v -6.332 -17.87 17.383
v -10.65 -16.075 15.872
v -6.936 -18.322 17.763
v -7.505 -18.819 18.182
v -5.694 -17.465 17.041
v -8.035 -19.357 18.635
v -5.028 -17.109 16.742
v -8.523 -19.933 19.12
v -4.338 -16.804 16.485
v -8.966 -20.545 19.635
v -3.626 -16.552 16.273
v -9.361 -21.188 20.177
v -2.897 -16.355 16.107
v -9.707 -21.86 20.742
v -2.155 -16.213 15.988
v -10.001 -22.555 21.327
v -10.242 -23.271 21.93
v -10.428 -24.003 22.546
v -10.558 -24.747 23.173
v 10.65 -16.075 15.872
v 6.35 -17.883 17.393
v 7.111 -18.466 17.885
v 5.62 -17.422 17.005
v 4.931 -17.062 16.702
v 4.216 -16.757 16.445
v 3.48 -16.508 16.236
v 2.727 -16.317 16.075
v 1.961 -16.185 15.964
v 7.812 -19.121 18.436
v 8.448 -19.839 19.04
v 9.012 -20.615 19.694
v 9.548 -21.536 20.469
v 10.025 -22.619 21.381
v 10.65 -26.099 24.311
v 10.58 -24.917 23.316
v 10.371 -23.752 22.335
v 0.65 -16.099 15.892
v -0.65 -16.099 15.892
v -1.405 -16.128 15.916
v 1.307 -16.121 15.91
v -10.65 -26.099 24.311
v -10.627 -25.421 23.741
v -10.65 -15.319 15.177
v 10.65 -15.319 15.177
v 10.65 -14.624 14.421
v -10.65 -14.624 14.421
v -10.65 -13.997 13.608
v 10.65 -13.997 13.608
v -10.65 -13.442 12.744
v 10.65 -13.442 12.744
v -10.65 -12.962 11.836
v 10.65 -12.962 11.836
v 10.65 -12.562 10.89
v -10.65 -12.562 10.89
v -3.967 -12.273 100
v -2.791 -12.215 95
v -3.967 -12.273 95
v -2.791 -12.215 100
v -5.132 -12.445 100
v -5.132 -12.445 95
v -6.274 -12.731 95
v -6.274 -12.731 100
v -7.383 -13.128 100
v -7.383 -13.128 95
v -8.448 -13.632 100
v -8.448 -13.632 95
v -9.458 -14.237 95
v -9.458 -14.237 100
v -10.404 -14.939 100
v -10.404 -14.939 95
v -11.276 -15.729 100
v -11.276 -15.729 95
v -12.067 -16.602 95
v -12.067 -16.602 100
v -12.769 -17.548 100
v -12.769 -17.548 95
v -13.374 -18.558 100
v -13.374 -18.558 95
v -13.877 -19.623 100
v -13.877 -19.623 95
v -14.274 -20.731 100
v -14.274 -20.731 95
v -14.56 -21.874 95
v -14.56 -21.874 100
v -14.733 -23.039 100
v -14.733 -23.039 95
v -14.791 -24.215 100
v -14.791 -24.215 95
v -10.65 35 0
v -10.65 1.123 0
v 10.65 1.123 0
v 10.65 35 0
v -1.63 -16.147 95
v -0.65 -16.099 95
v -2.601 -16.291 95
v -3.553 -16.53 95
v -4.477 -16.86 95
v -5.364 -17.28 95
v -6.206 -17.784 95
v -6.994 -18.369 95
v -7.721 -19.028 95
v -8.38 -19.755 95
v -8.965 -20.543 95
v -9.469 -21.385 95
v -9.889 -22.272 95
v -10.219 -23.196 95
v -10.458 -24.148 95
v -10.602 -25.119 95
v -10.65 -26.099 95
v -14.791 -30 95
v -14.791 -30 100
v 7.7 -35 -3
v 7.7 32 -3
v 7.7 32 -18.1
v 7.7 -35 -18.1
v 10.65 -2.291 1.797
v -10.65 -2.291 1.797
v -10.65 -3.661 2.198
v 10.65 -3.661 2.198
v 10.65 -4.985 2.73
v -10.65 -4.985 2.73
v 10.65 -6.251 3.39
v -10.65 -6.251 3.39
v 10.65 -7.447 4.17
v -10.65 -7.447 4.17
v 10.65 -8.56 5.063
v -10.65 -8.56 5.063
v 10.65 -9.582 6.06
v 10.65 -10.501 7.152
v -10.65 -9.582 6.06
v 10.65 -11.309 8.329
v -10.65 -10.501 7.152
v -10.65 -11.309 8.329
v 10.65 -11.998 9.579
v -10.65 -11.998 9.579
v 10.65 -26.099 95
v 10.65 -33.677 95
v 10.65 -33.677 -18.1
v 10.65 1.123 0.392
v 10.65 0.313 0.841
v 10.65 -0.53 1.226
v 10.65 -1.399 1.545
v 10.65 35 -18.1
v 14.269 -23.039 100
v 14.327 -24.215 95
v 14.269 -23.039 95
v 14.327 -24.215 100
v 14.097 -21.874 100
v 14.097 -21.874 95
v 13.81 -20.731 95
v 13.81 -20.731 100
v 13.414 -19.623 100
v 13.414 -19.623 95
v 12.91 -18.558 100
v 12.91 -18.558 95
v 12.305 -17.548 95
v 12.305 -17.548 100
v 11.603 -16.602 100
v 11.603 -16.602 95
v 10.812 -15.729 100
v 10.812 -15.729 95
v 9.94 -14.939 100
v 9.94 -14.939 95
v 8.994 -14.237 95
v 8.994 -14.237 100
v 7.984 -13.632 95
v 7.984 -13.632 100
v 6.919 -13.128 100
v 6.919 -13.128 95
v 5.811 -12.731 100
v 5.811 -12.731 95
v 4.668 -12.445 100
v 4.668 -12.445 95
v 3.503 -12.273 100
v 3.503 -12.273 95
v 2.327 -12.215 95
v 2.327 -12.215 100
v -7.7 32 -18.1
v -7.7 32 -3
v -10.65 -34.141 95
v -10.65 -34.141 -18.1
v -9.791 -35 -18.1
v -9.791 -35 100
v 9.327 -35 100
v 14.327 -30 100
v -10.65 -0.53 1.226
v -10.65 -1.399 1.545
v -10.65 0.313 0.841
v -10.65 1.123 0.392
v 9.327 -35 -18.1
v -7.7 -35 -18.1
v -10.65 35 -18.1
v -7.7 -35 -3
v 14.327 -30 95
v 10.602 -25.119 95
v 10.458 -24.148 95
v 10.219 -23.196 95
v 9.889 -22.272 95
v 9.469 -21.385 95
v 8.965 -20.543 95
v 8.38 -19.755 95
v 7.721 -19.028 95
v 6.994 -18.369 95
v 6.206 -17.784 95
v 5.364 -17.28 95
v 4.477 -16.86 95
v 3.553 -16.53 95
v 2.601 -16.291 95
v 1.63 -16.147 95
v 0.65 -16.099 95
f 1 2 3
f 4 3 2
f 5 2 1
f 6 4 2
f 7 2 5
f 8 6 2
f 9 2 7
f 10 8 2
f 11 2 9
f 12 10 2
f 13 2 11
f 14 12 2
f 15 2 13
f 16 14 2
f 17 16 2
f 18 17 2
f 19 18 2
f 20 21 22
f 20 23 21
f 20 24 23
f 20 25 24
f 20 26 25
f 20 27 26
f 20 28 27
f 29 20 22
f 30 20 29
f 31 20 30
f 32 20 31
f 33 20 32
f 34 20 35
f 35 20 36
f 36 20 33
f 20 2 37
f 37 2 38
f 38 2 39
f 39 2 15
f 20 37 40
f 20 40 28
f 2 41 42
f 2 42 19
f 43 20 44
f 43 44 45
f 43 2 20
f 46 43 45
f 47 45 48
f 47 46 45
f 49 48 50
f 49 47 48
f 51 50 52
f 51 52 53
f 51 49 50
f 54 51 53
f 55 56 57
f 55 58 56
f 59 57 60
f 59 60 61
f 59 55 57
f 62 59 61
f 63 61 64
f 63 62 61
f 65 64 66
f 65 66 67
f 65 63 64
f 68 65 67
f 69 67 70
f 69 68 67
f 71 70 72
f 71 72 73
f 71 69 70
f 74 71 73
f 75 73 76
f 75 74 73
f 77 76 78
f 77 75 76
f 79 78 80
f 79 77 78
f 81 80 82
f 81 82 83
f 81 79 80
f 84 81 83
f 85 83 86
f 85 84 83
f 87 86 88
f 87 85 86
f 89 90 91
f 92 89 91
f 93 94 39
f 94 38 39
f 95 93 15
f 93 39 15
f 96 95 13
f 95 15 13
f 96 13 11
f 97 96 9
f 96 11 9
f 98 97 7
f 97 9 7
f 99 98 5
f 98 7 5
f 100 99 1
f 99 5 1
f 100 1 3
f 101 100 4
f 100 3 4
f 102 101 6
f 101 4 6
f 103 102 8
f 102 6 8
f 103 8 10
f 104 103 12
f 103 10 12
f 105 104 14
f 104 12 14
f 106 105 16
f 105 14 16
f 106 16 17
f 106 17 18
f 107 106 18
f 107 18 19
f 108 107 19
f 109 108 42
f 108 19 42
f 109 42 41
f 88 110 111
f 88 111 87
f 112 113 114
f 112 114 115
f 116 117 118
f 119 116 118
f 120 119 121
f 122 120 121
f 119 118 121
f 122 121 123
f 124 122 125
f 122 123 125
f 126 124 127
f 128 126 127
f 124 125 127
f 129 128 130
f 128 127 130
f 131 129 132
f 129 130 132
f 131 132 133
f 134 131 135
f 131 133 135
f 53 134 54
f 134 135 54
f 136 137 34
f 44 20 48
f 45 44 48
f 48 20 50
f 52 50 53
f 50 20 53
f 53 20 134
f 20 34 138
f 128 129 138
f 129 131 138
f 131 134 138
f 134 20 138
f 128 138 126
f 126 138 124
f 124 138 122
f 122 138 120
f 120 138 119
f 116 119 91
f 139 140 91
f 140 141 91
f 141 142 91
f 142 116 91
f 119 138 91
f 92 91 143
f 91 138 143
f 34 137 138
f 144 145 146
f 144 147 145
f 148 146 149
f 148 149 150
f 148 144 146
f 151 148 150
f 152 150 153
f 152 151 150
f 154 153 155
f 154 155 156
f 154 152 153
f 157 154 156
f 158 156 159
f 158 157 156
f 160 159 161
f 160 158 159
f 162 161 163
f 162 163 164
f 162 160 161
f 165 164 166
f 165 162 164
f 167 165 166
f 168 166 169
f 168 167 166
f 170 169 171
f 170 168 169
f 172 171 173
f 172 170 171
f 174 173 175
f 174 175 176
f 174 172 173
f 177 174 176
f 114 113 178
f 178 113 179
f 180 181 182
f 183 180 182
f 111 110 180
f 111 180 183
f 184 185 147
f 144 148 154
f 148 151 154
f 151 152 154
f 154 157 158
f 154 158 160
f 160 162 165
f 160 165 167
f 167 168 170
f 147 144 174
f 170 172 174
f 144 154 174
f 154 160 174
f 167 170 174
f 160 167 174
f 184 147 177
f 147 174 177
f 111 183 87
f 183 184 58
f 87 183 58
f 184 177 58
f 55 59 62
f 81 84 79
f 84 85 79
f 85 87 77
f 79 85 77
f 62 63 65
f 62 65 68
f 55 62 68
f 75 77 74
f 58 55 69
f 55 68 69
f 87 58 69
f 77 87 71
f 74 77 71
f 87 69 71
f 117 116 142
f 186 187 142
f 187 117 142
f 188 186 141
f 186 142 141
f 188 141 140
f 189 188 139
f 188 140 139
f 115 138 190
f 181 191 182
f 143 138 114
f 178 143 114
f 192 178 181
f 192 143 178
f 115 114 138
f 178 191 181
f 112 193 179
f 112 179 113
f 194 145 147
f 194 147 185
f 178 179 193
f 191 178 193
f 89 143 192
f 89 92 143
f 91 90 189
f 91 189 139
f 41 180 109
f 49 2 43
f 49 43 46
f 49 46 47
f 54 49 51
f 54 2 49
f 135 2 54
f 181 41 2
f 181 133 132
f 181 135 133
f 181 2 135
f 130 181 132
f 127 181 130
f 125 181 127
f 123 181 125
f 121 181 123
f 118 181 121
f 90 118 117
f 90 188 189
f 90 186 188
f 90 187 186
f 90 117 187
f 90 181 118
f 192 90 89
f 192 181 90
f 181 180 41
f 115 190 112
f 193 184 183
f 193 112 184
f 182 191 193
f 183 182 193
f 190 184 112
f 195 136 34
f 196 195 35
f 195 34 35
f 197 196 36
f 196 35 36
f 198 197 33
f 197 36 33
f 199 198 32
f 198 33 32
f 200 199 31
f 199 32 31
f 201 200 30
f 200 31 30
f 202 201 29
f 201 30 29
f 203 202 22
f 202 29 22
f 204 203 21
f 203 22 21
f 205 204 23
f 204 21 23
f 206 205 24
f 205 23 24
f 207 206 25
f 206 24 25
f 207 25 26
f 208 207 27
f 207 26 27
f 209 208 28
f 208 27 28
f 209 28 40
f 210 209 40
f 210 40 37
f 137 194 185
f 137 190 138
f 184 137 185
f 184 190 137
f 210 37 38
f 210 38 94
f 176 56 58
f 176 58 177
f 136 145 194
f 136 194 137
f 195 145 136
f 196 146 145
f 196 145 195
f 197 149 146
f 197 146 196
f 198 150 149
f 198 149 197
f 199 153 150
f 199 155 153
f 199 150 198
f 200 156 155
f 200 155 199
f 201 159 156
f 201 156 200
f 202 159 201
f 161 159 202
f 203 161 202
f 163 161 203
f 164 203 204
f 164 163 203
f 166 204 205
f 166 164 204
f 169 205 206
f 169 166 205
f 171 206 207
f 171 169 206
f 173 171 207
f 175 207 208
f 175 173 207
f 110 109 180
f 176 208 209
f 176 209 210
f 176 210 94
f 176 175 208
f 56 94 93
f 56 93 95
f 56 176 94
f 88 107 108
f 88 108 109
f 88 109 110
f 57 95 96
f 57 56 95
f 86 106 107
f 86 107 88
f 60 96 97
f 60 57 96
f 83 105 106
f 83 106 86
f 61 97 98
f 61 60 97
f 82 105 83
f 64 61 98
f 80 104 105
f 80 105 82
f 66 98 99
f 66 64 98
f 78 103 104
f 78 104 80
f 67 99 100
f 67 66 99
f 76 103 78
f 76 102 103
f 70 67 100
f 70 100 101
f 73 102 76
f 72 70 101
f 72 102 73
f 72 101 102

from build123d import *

# Parameters (mm, degrees)
SKETCH1_W           = 21.3
SKETCH1_H           = 70
BOSS_EXTRUDE1_DEPTH = 3
BOSS_EXTRUDE2_DEPTH = 15.1
SKETCH3_W           = 15.400000000000002
SKETCH3_H           = 3
BOSS_EXTRUDE3_DEPTH = 15.1
BOSS_EXTRUDE4_DEPTH = 95
BOSS_EXTRUDE5_DEPTH = 5
SKETCH9_W           = 21.3
SKETCH9_H           = 17.22200087142766
BOSS_EXTRUDE6_DEPTH = 16.000000000000007
SKETCH12_R          = 14.60799399049553
CUT_EXTRUDE1_DEPTH  = 109.85245207766768
CHAMFER4_SIZE       = 1
CHAMFER5_SIZE       = 5
CHAMFER6_SIZE       = 5
FILLET4_R           = 12
FILLET5_R           = 12
FILLET6_R           = 12
FILLET7_R           = 10


with BuildPart() as part:
    # Sketch1 → Boss-Extrude1 (new body)
    with BuildSketch(Plane.XY):
        Rectangle(SKETCH1_W, SKETCH1_H)
    extrude(amount=-BOSS_EXTRUDE1_DEPTH)

    # Sketch2 → Boss-Extrude2 (add)
    with BuildSketch(Plane(origin=(0, 0, -3), x_dir=(-1, 0, 0), z_dir=(0, 0, -1))):
        Polygon((-10.649999999999999, 35), (-7.700000000000009, 35), (-7.700000000000002, -35), (-10.649999999999999, -35), align=None)
        Polygon((10.650000000000002, 35), (7.699999999999991, 35), (7.699999999999998, -35), (10.650000000000002, -35), align=None)
    extrude(amount=BOSS_EXTRUDE2_DEPTH)

    # Sketch3 → Boss-Extrude3 (add)
    with BuildSketch(Plane(origin=(0, 0, -3), x_dir=(-1, 0, 0), z_dir=(0, 0, -1))):
        with Locations((-9.33e-15, 33.5)):
            Rectangle(SKETCH3_W, SKETCH3_H)
    extrude(amount=BOSS_EXTRUDE3_DEPTH)

    # Sketch4 → Boss-Extrude4 (add)
    with BuildSketch(Plane.XY):
        Polygon((-10.650000000000002, -16.099065593181194), (10.649999999999999, -16.099065593181194), (10.650000000000007, -35), (-10.649999999999993, -35), align=None)
    extrude(amount=BOSS_EXTRUDE4_DEPTH)

    # Sketch6 → Boss-Extrude5 (add)
    with BuildSketch(Plane.XY.offset(95)):
        Polygon((-14.790899735714902, -12.21473987671473), (14.327115992863071, -12.21473987671473), (14.327115992863074, -35), (-14.790899735714893, -35), align=None)
    extrude(amount=BOSS_EXTRUDE5_DEPTH)

    # Sketch9 → Boss-Extrude6 (add)
    with BuildSketch(Plane.XY):
        with Locations((-1.78e-15, -7.488065157467364)):
            Rectangle(SKETCH9_W, SKETCH9_H)
    extrude(amount=BOSS_EXTRUDE6_DEPTH)

    # Sketch12 → Cut-Extrude1 (cut, through all)
    with BuildSketch(Plane.ZY.offset(10.650000000000002)):
        with Locations((16.000000000000007, 1.122935278246466)):
            Circle(SKETCH12_R)
    extrude(amount=-CUT_EXTRUDE1_DEPTH, mode=Mode.SUBTRACT)

    # Chamfer3
    # the kernel refuses this chamfer: 3 mm, written as the material it takes off along each edge
    with BuildSketch(Plane(origin=(17.73850714382705, -13.485058712249064, 16.000000000000007), x_dir=(0, 0.08550168468531993, -0.9963380259309449), z_dir=(-1, 0, 0))) as chamfer3_piece_1_section:
        with BuildLine():
            Line((2.582869005863168, -0.08485281374238583), (-0.31934564535848514, 2.817361837479259))
            Line((-0.31934564535848514, 2.817361837479259), (-0.37912592691434055, 2.81223173639814))
            ThreePointArc((-0.37912592691434055, 2.81223173639814), (-0.18095110257164257, 1.4068549031398474), (-0.05978028155585542, -0.00513010108111909))
            Line((-0.05978028155585542, -0.00513010108111909), (0.00513010108111924, -0.05978028155585719))
            ThreePointArc((0.00513010108111924, -0.05978028155585719), (1.2915393356537215, -0.00656807524010173), (2.5777389047820485, -0.1446330952982423))
            Line((2.5777389047820485, -0.1446330952982423), (2.582869005863168, -0.08485281374238583))
        make_face()
    chamfer3_piece_1 = extrude(amount=35.4770142876541, mode=Mode.PRIVATE)
    chamfer3_piece_1 = split(chamfer3_piece_1, bisect_by=Plane(origin=(17.73850714382705, -16.099065593181194, 16.000000000000007), z_dir=(0, 1, 0)), keep=Keep.TOP, mode=Mode.PRIVATE)
    add(chamfer3_piece_1, mode=Mode.SUBTRACT)

    # Chamfer4
    # the kernel refuses this chamfer: 1 mm, written as the material it takes off along each edge
    with BuildSketch(Plane(origin=(13.31779092299838, 1.122935278246466, 1.3920060095044775), x_dir=(0, -0.9993692754635791, 0.0355112835504551), z_dir=(-1, 0, 0))) as chamfer4_piece_1:
        with BuildLine():
            Line((1.0374972333996406, 1e-17), (-CHAMFER4_SIZE * 0.0355112835505, -CHAMFER4_SIZE * 0.999369275464))
            Line((-CHAMFER4_SIZE * 0.0355112835505, -CHAMFER4_SIZE * 0.999369275464), (0, 0))
            ThreePointArc((0, 0), (0.5334069539111667, -0.00920626580887721), (1.0374972333996406, 1e-17))
        make_face()
    extrude(amount=26.63558184599676, mode=Mode.SUBTRACT)

    # Chamfer5
    chamfer5_edges = [part.edges().sort_by_distance(p)[0] for p in [
        (-14.790899735714893, -35, 97.5),
    ]]
    chamfer(chamfer5_edges, length=CHAMFER5_SIZE)

    # Chamfer6
    chamfer6_edges = [part.edges().sort_by_distance(p)[0] for p in [
        (14.327115992863074, -35, 97.5),
    ]]
    chamfer(chamfer6_edges, length=CHAMFER6_SIZE)

    # Fillet4
    fillet4_edges = [part.edges().sort_by_distance(p)[0] for p in [
        (14.327115992863071, -12.21473987671473, 97.5),
        (-14.790899735714902, -12.21473987671473, 97.5),
    ]]
    fillet(fillet4_edges, radius=FILLET4_R)

    # Fillet5
    fillet5_edges = [part.edges().sort_by_distance(p)[0] for p in [
        (-1.78e-15, -13.271474119451348, 13.511131478397797),
    ]]
    fillet(fillet5_edges, radius=FILLET5_R)

    # Fillet6
    # the kernel refuses this fillet: 12 mm, written as the material it takes off along each edge
    with BuildSketch(Plane(origin=(16.66324146618684, 0.086092419807557, 1.428848867941594), x_dir=(0, -0.9882482751789802, 0.15285727527916634), z_dir=(-1, 0, 0))) as fillet6_piece_1:
        with BuildLine():
            CenterArc((3.393233706942116, -11.959263365525597), FILLET6_R, 94.7223972339899, 17.695866700852164)
            Line((-1.1831471407174274, -0.8661691922493711), (-1.274674757670618, -0.6443073087838466))
            ThreePointArc((-1.274674757670618, -0.6443073087838466), (-0.7333441241917547, -0.2394325626577685), (-0.1417705538330419, 0.19365203346691875))
            Line((-0.1417705538330419, 0.19365203346691875), (0.01975874240954748, 0.23918526731049536))
            ThreePointArc((0.01975874240954748, 0.23918526731049536), (1.2026482932374447, 0.19040995736707406), (2.38553784406539, 0.23918526731051196))
            Line((2.38553784406539, 0.23918526731051196), (2.405296586474737, 0))
        make_face()
    extrude(amount=33.32648293237368, mode=Mode.SUBTRACT)

    # Fillet7
    fillet7_edges = [part.edges().sort_by_distance(p)[0] for p in [
        (-10.650000000000002, -16.099065593181095, 55.44588674849325),
        (10.649999999999999, -16.099065593181095, 55.44588674849325),
    ]]
    fillet(fillet7_edges, radius=FILLET7_R)


solid = part.part
